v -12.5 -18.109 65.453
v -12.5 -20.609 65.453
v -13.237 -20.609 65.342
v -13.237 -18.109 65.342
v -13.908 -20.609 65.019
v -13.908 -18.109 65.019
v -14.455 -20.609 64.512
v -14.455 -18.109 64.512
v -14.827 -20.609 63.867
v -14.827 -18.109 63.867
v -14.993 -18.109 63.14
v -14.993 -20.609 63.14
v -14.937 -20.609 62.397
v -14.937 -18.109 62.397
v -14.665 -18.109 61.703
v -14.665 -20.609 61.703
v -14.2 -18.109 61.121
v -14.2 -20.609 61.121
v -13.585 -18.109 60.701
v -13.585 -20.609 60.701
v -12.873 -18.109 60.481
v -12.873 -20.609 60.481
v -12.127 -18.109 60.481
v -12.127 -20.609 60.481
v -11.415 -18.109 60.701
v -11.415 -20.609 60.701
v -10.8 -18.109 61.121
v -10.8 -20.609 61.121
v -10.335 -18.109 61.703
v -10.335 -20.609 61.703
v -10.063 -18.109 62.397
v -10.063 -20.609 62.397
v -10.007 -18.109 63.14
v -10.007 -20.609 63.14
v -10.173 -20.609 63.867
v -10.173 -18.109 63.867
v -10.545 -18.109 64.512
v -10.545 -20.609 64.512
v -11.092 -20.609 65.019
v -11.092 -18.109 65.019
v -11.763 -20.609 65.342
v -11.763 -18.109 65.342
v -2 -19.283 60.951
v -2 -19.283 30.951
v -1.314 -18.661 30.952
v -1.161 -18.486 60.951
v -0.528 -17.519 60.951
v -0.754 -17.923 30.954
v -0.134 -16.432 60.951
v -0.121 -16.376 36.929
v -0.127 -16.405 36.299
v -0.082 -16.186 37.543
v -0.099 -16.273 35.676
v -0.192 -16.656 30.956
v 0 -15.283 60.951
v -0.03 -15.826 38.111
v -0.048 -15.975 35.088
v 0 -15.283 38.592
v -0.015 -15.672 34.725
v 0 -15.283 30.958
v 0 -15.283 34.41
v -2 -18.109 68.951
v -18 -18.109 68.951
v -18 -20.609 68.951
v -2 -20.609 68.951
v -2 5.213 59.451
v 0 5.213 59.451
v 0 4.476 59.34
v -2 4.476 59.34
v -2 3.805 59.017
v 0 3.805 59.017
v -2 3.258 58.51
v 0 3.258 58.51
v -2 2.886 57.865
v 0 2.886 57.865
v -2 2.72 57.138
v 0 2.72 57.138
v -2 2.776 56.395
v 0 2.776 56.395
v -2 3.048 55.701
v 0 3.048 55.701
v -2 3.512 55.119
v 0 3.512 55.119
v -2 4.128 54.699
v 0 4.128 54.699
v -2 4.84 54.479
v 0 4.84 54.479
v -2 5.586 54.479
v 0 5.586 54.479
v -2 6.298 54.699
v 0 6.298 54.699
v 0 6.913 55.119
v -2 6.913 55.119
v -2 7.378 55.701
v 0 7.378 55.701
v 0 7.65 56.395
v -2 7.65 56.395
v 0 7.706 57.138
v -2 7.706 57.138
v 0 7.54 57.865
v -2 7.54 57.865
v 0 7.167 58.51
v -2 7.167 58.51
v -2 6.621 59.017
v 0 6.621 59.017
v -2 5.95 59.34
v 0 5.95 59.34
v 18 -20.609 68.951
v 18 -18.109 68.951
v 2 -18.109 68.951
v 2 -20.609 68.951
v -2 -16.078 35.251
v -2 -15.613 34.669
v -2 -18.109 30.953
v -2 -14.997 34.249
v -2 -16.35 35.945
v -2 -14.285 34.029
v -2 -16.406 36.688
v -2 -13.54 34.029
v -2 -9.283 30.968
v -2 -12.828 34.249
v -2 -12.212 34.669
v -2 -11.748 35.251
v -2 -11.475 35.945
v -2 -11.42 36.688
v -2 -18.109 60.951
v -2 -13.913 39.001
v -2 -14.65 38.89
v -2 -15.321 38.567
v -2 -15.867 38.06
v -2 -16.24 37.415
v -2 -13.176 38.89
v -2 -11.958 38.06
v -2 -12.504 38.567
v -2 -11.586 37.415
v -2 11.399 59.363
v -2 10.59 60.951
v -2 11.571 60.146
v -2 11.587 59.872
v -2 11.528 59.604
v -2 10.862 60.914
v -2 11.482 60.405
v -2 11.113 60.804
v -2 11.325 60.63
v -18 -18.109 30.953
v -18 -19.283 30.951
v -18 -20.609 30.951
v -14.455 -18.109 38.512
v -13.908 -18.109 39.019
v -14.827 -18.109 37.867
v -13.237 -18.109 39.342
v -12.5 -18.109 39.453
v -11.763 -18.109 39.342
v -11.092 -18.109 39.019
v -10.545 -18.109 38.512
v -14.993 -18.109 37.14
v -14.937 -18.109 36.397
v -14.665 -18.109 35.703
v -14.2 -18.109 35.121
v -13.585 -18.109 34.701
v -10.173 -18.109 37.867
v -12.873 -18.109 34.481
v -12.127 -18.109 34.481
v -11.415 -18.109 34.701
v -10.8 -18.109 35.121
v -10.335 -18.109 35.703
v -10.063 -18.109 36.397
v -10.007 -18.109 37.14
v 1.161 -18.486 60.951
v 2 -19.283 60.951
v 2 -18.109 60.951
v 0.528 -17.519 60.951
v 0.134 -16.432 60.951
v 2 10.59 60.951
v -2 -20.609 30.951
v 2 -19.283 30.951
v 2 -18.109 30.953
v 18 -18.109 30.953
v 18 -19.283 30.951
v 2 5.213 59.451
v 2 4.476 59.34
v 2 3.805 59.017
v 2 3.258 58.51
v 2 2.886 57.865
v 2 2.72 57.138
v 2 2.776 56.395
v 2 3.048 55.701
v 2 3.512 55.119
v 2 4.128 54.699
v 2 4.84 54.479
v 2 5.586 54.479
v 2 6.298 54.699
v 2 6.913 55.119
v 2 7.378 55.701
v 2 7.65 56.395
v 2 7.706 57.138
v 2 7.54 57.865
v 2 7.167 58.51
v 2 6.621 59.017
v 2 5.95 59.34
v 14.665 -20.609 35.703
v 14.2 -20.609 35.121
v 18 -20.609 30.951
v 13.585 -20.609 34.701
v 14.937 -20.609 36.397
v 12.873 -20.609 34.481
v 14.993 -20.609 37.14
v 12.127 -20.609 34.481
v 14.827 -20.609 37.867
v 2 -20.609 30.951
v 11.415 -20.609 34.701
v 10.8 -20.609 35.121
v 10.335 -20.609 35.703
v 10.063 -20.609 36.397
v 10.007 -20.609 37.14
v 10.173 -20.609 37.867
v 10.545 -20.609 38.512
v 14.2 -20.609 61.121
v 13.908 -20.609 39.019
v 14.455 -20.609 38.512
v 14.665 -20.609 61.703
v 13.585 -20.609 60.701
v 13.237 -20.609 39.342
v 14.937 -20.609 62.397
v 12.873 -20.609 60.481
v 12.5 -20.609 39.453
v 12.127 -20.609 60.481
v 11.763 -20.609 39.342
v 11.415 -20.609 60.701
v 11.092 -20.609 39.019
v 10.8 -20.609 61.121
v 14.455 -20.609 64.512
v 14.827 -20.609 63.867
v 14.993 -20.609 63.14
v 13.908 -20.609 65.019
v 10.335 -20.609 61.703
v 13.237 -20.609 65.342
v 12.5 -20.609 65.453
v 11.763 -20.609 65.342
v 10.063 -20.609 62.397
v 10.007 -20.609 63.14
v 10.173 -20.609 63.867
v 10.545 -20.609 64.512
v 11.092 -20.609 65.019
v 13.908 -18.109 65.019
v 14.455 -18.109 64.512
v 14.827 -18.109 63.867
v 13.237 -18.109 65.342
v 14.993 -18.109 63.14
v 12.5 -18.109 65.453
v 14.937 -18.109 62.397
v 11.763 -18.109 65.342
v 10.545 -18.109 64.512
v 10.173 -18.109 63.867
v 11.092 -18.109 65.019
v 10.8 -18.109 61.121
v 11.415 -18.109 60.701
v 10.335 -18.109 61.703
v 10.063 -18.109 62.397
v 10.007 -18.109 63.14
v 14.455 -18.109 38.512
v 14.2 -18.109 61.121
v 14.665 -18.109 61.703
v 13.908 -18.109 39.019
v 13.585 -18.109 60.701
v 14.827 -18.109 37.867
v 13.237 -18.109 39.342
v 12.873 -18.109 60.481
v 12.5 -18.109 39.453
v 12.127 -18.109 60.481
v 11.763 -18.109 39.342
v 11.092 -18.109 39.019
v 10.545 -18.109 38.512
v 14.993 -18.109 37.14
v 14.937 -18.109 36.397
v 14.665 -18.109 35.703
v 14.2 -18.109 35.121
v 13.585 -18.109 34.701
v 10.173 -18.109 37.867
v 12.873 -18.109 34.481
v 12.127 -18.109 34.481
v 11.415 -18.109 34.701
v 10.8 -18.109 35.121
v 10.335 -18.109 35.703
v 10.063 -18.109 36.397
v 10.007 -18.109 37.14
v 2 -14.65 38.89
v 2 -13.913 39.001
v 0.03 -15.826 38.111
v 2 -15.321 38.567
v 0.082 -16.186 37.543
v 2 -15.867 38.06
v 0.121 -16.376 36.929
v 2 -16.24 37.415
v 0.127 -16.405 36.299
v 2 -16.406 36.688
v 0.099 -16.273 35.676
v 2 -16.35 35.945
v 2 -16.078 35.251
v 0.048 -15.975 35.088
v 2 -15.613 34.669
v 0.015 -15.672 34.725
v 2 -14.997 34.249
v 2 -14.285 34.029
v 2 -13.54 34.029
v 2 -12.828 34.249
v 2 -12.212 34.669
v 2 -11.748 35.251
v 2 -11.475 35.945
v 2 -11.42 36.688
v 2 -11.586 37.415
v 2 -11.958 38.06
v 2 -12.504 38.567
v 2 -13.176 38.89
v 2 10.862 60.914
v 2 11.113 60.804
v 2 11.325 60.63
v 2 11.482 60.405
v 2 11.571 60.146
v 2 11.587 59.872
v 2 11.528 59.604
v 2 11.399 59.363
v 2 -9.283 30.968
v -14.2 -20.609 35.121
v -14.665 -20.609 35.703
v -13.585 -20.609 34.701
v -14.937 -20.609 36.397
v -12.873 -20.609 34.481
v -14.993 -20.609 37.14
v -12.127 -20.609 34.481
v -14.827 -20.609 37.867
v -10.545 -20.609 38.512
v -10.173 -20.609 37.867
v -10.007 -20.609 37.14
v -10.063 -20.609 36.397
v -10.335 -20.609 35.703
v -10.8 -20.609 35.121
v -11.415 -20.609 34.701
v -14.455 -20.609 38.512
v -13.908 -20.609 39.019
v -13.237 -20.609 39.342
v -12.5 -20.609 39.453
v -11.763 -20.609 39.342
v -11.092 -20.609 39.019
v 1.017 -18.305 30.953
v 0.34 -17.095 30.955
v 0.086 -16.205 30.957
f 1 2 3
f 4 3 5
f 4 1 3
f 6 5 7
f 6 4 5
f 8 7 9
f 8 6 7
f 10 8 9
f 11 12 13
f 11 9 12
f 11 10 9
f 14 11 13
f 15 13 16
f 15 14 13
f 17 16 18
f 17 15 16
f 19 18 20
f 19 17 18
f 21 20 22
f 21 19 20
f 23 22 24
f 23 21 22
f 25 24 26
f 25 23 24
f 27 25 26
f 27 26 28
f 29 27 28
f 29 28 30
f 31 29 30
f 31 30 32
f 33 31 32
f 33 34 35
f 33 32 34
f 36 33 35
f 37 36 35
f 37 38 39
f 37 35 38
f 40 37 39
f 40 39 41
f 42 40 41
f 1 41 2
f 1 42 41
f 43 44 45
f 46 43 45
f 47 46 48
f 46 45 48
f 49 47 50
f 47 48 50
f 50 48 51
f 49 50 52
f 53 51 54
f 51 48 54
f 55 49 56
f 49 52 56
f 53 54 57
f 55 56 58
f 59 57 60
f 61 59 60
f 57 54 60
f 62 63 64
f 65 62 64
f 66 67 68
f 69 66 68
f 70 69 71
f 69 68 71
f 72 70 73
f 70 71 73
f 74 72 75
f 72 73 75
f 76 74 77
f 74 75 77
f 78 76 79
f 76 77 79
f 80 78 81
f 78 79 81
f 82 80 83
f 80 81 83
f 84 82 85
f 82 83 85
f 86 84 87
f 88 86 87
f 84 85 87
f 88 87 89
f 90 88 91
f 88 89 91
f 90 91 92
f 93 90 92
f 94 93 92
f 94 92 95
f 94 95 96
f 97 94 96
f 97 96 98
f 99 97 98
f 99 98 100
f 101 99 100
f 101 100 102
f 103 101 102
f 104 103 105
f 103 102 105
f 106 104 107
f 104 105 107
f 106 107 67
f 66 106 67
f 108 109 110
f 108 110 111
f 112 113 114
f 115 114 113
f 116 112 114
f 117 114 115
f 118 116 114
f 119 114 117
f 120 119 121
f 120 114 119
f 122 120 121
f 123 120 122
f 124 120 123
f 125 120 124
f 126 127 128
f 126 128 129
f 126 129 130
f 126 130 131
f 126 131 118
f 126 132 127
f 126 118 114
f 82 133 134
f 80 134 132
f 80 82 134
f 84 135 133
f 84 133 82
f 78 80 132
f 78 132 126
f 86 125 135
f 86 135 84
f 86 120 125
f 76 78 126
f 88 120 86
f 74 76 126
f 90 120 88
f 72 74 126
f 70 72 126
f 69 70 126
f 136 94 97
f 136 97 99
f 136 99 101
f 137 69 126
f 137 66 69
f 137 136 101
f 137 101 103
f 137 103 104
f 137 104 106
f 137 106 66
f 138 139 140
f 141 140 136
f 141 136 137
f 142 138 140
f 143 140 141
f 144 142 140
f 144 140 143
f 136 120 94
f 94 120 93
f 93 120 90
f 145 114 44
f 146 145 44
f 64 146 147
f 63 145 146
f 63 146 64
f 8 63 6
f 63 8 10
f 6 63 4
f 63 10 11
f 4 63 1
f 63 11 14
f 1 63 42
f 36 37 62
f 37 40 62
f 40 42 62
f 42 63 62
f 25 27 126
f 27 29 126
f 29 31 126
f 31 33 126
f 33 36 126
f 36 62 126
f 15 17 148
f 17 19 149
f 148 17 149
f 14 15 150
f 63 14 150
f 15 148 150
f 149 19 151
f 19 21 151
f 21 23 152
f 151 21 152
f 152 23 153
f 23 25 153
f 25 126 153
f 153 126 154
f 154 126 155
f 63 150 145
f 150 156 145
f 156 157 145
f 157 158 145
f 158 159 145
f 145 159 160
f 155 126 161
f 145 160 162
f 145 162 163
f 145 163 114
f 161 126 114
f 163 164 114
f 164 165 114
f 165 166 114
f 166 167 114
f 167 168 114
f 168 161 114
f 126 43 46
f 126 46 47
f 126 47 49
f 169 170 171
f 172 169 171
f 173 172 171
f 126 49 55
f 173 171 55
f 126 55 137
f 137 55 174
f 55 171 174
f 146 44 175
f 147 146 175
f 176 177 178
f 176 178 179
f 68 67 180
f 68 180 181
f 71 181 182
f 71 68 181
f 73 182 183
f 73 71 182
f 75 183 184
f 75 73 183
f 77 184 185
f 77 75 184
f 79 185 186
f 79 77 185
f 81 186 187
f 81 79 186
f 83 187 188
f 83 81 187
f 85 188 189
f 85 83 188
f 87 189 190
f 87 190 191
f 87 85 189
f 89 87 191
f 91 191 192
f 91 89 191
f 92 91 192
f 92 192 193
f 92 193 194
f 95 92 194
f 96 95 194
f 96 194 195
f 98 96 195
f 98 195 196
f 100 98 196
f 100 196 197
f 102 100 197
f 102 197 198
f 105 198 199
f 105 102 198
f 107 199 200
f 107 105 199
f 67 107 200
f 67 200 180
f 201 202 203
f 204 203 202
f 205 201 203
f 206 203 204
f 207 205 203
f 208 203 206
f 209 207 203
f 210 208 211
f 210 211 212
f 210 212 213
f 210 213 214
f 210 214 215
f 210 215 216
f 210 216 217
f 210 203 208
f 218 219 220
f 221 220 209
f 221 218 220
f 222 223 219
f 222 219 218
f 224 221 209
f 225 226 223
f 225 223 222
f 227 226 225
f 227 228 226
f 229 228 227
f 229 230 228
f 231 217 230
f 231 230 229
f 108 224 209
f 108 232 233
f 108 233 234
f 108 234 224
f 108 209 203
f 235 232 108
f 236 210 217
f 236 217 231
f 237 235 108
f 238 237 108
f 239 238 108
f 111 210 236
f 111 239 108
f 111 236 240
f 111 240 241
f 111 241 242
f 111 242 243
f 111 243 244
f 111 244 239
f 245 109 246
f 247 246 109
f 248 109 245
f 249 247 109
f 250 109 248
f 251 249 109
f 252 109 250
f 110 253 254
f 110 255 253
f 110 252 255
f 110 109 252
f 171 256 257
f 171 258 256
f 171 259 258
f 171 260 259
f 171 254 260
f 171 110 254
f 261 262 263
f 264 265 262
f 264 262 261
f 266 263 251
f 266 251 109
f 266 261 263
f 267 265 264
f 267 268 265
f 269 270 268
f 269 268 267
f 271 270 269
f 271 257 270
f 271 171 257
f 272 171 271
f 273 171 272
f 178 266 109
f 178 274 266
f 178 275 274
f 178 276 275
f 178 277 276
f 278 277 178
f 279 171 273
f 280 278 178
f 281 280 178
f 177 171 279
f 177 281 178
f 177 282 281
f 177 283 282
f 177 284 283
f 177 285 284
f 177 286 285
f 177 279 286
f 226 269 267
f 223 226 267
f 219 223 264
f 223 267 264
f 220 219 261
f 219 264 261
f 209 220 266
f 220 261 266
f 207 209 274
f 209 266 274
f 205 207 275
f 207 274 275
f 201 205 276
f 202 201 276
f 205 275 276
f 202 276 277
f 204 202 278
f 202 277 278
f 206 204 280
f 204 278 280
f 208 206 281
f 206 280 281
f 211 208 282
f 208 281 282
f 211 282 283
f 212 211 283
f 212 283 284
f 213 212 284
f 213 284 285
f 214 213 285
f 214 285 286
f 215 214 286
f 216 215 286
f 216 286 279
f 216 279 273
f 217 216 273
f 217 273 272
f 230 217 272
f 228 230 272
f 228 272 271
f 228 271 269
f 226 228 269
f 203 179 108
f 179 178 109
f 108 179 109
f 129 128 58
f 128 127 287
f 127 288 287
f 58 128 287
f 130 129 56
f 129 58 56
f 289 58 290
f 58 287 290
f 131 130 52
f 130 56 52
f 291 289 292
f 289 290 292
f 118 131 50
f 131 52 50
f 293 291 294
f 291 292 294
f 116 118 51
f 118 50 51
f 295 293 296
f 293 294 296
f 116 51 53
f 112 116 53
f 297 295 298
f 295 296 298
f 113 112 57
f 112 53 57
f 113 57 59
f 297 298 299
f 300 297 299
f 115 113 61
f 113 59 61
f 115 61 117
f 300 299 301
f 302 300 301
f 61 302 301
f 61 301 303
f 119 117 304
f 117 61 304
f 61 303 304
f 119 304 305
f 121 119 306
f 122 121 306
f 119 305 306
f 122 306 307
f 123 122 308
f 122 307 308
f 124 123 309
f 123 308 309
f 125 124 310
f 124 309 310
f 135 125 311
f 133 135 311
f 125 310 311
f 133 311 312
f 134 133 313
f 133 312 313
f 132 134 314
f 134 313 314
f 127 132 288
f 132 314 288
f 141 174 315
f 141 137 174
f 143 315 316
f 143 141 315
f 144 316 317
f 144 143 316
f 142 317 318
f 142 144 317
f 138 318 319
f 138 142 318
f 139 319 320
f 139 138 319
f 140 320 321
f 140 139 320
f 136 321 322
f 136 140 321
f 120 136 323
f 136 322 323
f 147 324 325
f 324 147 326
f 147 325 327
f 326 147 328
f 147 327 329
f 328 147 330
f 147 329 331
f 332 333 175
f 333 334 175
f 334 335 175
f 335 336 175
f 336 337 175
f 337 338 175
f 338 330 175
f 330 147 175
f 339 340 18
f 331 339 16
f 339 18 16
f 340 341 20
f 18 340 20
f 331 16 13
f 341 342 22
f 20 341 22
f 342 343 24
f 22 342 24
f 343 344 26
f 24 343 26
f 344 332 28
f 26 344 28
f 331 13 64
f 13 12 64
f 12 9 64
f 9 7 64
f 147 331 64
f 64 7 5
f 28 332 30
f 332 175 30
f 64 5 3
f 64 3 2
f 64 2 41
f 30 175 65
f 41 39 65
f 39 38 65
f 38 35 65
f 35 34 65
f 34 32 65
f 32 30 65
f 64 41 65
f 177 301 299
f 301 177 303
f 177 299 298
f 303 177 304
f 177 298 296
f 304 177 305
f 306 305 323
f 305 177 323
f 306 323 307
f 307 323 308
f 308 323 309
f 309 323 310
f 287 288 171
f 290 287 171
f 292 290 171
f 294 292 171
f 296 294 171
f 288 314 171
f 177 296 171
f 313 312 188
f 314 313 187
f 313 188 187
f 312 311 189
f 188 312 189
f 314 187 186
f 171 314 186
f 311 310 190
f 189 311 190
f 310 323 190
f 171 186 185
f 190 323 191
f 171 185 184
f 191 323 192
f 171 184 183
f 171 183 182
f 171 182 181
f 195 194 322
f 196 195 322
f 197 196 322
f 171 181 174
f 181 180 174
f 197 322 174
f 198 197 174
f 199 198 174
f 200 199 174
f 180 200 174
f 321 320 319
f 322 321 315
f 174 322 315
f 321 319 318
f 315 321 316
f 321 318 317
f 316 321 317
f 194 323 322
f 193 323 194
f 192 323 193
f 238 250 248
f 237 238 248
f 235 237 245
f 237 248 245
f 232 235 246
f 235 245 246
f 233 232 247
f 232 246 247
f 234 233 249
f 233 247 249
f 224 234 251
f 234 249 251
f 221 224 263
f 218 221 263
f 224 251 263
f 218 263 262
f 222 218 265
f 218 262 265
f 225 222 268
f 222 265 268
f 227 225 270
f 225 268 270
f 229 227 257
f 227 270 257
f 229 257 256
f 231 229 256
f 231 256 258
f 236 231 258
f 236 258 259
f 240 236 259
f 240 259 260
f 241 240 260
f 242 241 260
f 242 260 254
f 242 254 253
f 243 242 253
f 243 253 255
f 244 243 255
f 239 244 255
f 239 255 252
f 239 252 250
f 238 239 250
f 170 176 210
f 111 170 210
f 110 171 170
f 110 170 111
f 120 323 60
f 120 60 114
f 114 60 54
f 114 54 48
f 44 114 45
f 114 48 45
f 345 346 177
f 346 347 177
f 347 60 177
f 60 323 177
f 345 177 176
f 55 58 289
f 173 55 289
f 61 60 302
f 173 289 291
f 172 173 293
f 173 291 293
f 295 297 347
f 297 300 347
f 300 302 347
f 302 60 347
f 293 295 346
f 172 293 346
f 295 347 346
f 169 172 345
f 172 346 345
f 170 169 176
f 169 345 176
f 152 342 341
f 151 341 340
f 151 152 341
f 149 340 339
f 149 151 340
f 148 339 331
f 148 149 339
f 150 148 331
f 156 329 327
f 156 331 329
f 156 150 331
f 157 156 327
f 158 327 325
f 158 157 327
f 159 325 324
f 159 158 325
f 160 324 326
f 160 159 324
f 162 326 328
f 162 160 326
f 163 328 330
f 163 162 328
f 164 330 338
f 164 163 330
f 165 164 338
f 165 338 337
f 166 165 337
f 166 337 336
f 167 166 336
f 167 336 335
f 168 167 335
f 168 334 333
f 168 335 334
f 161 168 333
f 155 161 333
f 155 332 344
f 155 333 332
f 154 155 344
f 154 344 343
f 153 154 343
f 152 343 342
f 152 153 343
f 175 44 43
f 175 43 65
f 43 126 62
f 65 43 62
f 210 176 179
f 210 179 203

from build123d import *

# Parameters (mm, degrees)
SKETCH1_R            = 2.5
BOSS_EXTRUDE2_DEPTH  = 2
BOSS_EXTRUDE4_DEPTH  = 16
FILLET1_R            = 5
FILLET1_OF_MIRROR1_R = 5
SKETCH3_R            = 2.5
CUT_EXTRUDE2_DEPTH   = 78.57995838
FILLET2_R            = 1


with BuildPart() as part:
    # Sketch1 → Boss-Extrude2 (new body)
    with BuildSketch(Plane(origin=(0, 0, 0), x_dir=(0, 0, -1), z_dir=(1, 0, 0))):
        Polygon((-60.951444932, 12.55580533), (-30.968352486, -9.282744271), (-30.951444932, -19.282744271), (-60.951444932, -19.282744271), align=None)
        with Locations(Location((-36.501270434, -13.912745065, 0), (0, 0, 180))):
            Circle(SKETCH1_R, mode=Mode.SUBTRACT)
        with Locations(Location((-56.951444932, 5.21290167, 0), (0, 0, 180))):
            Circle(SKETCH1_R, mode=Mode.SUBTRACT)
    boss_extrude2 = extrude(amount=BOSS_EXTRUDE2_DEPTH)

    # Sketch2 → Boss-Extrude4 (add)
    with BuildSketch(Plane(origin=(2, 0, 0), x_dir=(0, 0, -1), z_dir=(1, 0, 0))):
        Polygon((-68.951444932, -20.609291835), (-68.951444932, -19.609291835), (-68.951444932, -18.109291835), (-30.953428953, -18.109291835), (-30.951444932, -19.282744271), (-30.951444932, -20.609291835), align=None)
    boss_extrude4 = extrude(amount=BOSS_EXTRUDE4_DEPTH)

    # Fillet1
    # the kernel refuses this fillet: 5 mm, written as the material it takes off along each edge
    with BuildSketch(Plane(origin=(0, -19.282744271, 20.951444932), x_dir=(0, 1, 0), z_dir=(0, 0, 1))) as fillet1_piece_1:
        with BuildLine():
            CenterArc((4, -5), FILLET1_R, 90, 53.130102354)
            Line((0, -2), (-0.08, -1.94))
            ThreePointArc((-0.08, -1.94), (-0.1, -1), (-0.1, 0))
            Line((-0.1, 0), (0, 0.1))
            Line((0, 0.1), (4, 0.1))
            Line((4, 0.1), (4, 0))
        make_face()
    extrude(amount=50, mode=Mode.SUBTRACT)


with BuildPart() as mirror1_1:
    # Mirror1: Boss-Extrude2, Boss-Extrude4 across plane
    add(boss_extrude2.mirror(Plane(origin=(0, 0, 0), x_dir=(0, 0, 1), z_dir=(1, 0, 0))))
    add(boss_extrude4.mirror(Plane(origin=(0, 0, 0), x_dir=(0, 0, 1), z_dir=(1, 0, 0))))

    # Fillet1 of Mirror1
    # the kernel refuses this fillet: 5 mm, written as the material it takes off along each edge
    with BuildSketch(Plane(origin=(0, -19.282744271, 20.951444932), x_dir=(0, 1, 0), z_dir=(0, 0, 1))) as fillet1_of_mirror1_piece_1:
        with BuildLine():
            CenterArc((4, 5), FILLET1_OF_MIRROR1_R, 216.869897646, 53.130102354)
            Line((0, 2), (-0.08, 1.94))
            ThreePointArc((-0.08, 1.94), (-0.1, 1), (-0.1, 0))
            Line((-0.1, 0), (0, -0.1))
            Line((0, -0.1), (4, -0.1))
            Line((4, -0.1), (4, 0))
        make_face()
    extrude(amount=50, mode=Mode.SUBTRACT)


with BuildPart() as part_1:
    add(part.part)

    # Mirror1 united with what the copies touc: union Mirror1_1
    add(mirror1_1.part)

    # Sketch3 → Cut-Extrude2 (cut, through all)
    with BuildSketch(Plane(origin=(0, -18.109291835, 0), x_dir=(1, 0, 0), z_dir=(0, 1, 0))):
        with Locations(Location((12.5, -62.953428953, 0), (0, 0, 270))):
            Circle(SKETCH3_R)
        with Locations(Location((12.5, -36.953428953, 0), (0, 0, 270))):
            Circle(SKETCH3_R)
    cut_extrude2 = extrude(amount=-CUT_EXTRUDE2_DEPTH, mode=Mode.SUBTRACT)

    # Mirror2: Cut-Extrude2 across plane
    add(cut_extrude2.mirror(Plane(origin=(0, 0, 0), x_dir=(0, 0, 1), z_dir=(1, 0, 0))), mode=Mode.SUBTRACT)

    # Fillet2
    fillet2_edges = [part_1.edges().sort_by_distance(p)[0] for p in [
        (0, 12.55580533, 60.951444932),
    ]]
    fillet(fillet2_edges, radius=FILLET2_R)


solid = part_1.part
